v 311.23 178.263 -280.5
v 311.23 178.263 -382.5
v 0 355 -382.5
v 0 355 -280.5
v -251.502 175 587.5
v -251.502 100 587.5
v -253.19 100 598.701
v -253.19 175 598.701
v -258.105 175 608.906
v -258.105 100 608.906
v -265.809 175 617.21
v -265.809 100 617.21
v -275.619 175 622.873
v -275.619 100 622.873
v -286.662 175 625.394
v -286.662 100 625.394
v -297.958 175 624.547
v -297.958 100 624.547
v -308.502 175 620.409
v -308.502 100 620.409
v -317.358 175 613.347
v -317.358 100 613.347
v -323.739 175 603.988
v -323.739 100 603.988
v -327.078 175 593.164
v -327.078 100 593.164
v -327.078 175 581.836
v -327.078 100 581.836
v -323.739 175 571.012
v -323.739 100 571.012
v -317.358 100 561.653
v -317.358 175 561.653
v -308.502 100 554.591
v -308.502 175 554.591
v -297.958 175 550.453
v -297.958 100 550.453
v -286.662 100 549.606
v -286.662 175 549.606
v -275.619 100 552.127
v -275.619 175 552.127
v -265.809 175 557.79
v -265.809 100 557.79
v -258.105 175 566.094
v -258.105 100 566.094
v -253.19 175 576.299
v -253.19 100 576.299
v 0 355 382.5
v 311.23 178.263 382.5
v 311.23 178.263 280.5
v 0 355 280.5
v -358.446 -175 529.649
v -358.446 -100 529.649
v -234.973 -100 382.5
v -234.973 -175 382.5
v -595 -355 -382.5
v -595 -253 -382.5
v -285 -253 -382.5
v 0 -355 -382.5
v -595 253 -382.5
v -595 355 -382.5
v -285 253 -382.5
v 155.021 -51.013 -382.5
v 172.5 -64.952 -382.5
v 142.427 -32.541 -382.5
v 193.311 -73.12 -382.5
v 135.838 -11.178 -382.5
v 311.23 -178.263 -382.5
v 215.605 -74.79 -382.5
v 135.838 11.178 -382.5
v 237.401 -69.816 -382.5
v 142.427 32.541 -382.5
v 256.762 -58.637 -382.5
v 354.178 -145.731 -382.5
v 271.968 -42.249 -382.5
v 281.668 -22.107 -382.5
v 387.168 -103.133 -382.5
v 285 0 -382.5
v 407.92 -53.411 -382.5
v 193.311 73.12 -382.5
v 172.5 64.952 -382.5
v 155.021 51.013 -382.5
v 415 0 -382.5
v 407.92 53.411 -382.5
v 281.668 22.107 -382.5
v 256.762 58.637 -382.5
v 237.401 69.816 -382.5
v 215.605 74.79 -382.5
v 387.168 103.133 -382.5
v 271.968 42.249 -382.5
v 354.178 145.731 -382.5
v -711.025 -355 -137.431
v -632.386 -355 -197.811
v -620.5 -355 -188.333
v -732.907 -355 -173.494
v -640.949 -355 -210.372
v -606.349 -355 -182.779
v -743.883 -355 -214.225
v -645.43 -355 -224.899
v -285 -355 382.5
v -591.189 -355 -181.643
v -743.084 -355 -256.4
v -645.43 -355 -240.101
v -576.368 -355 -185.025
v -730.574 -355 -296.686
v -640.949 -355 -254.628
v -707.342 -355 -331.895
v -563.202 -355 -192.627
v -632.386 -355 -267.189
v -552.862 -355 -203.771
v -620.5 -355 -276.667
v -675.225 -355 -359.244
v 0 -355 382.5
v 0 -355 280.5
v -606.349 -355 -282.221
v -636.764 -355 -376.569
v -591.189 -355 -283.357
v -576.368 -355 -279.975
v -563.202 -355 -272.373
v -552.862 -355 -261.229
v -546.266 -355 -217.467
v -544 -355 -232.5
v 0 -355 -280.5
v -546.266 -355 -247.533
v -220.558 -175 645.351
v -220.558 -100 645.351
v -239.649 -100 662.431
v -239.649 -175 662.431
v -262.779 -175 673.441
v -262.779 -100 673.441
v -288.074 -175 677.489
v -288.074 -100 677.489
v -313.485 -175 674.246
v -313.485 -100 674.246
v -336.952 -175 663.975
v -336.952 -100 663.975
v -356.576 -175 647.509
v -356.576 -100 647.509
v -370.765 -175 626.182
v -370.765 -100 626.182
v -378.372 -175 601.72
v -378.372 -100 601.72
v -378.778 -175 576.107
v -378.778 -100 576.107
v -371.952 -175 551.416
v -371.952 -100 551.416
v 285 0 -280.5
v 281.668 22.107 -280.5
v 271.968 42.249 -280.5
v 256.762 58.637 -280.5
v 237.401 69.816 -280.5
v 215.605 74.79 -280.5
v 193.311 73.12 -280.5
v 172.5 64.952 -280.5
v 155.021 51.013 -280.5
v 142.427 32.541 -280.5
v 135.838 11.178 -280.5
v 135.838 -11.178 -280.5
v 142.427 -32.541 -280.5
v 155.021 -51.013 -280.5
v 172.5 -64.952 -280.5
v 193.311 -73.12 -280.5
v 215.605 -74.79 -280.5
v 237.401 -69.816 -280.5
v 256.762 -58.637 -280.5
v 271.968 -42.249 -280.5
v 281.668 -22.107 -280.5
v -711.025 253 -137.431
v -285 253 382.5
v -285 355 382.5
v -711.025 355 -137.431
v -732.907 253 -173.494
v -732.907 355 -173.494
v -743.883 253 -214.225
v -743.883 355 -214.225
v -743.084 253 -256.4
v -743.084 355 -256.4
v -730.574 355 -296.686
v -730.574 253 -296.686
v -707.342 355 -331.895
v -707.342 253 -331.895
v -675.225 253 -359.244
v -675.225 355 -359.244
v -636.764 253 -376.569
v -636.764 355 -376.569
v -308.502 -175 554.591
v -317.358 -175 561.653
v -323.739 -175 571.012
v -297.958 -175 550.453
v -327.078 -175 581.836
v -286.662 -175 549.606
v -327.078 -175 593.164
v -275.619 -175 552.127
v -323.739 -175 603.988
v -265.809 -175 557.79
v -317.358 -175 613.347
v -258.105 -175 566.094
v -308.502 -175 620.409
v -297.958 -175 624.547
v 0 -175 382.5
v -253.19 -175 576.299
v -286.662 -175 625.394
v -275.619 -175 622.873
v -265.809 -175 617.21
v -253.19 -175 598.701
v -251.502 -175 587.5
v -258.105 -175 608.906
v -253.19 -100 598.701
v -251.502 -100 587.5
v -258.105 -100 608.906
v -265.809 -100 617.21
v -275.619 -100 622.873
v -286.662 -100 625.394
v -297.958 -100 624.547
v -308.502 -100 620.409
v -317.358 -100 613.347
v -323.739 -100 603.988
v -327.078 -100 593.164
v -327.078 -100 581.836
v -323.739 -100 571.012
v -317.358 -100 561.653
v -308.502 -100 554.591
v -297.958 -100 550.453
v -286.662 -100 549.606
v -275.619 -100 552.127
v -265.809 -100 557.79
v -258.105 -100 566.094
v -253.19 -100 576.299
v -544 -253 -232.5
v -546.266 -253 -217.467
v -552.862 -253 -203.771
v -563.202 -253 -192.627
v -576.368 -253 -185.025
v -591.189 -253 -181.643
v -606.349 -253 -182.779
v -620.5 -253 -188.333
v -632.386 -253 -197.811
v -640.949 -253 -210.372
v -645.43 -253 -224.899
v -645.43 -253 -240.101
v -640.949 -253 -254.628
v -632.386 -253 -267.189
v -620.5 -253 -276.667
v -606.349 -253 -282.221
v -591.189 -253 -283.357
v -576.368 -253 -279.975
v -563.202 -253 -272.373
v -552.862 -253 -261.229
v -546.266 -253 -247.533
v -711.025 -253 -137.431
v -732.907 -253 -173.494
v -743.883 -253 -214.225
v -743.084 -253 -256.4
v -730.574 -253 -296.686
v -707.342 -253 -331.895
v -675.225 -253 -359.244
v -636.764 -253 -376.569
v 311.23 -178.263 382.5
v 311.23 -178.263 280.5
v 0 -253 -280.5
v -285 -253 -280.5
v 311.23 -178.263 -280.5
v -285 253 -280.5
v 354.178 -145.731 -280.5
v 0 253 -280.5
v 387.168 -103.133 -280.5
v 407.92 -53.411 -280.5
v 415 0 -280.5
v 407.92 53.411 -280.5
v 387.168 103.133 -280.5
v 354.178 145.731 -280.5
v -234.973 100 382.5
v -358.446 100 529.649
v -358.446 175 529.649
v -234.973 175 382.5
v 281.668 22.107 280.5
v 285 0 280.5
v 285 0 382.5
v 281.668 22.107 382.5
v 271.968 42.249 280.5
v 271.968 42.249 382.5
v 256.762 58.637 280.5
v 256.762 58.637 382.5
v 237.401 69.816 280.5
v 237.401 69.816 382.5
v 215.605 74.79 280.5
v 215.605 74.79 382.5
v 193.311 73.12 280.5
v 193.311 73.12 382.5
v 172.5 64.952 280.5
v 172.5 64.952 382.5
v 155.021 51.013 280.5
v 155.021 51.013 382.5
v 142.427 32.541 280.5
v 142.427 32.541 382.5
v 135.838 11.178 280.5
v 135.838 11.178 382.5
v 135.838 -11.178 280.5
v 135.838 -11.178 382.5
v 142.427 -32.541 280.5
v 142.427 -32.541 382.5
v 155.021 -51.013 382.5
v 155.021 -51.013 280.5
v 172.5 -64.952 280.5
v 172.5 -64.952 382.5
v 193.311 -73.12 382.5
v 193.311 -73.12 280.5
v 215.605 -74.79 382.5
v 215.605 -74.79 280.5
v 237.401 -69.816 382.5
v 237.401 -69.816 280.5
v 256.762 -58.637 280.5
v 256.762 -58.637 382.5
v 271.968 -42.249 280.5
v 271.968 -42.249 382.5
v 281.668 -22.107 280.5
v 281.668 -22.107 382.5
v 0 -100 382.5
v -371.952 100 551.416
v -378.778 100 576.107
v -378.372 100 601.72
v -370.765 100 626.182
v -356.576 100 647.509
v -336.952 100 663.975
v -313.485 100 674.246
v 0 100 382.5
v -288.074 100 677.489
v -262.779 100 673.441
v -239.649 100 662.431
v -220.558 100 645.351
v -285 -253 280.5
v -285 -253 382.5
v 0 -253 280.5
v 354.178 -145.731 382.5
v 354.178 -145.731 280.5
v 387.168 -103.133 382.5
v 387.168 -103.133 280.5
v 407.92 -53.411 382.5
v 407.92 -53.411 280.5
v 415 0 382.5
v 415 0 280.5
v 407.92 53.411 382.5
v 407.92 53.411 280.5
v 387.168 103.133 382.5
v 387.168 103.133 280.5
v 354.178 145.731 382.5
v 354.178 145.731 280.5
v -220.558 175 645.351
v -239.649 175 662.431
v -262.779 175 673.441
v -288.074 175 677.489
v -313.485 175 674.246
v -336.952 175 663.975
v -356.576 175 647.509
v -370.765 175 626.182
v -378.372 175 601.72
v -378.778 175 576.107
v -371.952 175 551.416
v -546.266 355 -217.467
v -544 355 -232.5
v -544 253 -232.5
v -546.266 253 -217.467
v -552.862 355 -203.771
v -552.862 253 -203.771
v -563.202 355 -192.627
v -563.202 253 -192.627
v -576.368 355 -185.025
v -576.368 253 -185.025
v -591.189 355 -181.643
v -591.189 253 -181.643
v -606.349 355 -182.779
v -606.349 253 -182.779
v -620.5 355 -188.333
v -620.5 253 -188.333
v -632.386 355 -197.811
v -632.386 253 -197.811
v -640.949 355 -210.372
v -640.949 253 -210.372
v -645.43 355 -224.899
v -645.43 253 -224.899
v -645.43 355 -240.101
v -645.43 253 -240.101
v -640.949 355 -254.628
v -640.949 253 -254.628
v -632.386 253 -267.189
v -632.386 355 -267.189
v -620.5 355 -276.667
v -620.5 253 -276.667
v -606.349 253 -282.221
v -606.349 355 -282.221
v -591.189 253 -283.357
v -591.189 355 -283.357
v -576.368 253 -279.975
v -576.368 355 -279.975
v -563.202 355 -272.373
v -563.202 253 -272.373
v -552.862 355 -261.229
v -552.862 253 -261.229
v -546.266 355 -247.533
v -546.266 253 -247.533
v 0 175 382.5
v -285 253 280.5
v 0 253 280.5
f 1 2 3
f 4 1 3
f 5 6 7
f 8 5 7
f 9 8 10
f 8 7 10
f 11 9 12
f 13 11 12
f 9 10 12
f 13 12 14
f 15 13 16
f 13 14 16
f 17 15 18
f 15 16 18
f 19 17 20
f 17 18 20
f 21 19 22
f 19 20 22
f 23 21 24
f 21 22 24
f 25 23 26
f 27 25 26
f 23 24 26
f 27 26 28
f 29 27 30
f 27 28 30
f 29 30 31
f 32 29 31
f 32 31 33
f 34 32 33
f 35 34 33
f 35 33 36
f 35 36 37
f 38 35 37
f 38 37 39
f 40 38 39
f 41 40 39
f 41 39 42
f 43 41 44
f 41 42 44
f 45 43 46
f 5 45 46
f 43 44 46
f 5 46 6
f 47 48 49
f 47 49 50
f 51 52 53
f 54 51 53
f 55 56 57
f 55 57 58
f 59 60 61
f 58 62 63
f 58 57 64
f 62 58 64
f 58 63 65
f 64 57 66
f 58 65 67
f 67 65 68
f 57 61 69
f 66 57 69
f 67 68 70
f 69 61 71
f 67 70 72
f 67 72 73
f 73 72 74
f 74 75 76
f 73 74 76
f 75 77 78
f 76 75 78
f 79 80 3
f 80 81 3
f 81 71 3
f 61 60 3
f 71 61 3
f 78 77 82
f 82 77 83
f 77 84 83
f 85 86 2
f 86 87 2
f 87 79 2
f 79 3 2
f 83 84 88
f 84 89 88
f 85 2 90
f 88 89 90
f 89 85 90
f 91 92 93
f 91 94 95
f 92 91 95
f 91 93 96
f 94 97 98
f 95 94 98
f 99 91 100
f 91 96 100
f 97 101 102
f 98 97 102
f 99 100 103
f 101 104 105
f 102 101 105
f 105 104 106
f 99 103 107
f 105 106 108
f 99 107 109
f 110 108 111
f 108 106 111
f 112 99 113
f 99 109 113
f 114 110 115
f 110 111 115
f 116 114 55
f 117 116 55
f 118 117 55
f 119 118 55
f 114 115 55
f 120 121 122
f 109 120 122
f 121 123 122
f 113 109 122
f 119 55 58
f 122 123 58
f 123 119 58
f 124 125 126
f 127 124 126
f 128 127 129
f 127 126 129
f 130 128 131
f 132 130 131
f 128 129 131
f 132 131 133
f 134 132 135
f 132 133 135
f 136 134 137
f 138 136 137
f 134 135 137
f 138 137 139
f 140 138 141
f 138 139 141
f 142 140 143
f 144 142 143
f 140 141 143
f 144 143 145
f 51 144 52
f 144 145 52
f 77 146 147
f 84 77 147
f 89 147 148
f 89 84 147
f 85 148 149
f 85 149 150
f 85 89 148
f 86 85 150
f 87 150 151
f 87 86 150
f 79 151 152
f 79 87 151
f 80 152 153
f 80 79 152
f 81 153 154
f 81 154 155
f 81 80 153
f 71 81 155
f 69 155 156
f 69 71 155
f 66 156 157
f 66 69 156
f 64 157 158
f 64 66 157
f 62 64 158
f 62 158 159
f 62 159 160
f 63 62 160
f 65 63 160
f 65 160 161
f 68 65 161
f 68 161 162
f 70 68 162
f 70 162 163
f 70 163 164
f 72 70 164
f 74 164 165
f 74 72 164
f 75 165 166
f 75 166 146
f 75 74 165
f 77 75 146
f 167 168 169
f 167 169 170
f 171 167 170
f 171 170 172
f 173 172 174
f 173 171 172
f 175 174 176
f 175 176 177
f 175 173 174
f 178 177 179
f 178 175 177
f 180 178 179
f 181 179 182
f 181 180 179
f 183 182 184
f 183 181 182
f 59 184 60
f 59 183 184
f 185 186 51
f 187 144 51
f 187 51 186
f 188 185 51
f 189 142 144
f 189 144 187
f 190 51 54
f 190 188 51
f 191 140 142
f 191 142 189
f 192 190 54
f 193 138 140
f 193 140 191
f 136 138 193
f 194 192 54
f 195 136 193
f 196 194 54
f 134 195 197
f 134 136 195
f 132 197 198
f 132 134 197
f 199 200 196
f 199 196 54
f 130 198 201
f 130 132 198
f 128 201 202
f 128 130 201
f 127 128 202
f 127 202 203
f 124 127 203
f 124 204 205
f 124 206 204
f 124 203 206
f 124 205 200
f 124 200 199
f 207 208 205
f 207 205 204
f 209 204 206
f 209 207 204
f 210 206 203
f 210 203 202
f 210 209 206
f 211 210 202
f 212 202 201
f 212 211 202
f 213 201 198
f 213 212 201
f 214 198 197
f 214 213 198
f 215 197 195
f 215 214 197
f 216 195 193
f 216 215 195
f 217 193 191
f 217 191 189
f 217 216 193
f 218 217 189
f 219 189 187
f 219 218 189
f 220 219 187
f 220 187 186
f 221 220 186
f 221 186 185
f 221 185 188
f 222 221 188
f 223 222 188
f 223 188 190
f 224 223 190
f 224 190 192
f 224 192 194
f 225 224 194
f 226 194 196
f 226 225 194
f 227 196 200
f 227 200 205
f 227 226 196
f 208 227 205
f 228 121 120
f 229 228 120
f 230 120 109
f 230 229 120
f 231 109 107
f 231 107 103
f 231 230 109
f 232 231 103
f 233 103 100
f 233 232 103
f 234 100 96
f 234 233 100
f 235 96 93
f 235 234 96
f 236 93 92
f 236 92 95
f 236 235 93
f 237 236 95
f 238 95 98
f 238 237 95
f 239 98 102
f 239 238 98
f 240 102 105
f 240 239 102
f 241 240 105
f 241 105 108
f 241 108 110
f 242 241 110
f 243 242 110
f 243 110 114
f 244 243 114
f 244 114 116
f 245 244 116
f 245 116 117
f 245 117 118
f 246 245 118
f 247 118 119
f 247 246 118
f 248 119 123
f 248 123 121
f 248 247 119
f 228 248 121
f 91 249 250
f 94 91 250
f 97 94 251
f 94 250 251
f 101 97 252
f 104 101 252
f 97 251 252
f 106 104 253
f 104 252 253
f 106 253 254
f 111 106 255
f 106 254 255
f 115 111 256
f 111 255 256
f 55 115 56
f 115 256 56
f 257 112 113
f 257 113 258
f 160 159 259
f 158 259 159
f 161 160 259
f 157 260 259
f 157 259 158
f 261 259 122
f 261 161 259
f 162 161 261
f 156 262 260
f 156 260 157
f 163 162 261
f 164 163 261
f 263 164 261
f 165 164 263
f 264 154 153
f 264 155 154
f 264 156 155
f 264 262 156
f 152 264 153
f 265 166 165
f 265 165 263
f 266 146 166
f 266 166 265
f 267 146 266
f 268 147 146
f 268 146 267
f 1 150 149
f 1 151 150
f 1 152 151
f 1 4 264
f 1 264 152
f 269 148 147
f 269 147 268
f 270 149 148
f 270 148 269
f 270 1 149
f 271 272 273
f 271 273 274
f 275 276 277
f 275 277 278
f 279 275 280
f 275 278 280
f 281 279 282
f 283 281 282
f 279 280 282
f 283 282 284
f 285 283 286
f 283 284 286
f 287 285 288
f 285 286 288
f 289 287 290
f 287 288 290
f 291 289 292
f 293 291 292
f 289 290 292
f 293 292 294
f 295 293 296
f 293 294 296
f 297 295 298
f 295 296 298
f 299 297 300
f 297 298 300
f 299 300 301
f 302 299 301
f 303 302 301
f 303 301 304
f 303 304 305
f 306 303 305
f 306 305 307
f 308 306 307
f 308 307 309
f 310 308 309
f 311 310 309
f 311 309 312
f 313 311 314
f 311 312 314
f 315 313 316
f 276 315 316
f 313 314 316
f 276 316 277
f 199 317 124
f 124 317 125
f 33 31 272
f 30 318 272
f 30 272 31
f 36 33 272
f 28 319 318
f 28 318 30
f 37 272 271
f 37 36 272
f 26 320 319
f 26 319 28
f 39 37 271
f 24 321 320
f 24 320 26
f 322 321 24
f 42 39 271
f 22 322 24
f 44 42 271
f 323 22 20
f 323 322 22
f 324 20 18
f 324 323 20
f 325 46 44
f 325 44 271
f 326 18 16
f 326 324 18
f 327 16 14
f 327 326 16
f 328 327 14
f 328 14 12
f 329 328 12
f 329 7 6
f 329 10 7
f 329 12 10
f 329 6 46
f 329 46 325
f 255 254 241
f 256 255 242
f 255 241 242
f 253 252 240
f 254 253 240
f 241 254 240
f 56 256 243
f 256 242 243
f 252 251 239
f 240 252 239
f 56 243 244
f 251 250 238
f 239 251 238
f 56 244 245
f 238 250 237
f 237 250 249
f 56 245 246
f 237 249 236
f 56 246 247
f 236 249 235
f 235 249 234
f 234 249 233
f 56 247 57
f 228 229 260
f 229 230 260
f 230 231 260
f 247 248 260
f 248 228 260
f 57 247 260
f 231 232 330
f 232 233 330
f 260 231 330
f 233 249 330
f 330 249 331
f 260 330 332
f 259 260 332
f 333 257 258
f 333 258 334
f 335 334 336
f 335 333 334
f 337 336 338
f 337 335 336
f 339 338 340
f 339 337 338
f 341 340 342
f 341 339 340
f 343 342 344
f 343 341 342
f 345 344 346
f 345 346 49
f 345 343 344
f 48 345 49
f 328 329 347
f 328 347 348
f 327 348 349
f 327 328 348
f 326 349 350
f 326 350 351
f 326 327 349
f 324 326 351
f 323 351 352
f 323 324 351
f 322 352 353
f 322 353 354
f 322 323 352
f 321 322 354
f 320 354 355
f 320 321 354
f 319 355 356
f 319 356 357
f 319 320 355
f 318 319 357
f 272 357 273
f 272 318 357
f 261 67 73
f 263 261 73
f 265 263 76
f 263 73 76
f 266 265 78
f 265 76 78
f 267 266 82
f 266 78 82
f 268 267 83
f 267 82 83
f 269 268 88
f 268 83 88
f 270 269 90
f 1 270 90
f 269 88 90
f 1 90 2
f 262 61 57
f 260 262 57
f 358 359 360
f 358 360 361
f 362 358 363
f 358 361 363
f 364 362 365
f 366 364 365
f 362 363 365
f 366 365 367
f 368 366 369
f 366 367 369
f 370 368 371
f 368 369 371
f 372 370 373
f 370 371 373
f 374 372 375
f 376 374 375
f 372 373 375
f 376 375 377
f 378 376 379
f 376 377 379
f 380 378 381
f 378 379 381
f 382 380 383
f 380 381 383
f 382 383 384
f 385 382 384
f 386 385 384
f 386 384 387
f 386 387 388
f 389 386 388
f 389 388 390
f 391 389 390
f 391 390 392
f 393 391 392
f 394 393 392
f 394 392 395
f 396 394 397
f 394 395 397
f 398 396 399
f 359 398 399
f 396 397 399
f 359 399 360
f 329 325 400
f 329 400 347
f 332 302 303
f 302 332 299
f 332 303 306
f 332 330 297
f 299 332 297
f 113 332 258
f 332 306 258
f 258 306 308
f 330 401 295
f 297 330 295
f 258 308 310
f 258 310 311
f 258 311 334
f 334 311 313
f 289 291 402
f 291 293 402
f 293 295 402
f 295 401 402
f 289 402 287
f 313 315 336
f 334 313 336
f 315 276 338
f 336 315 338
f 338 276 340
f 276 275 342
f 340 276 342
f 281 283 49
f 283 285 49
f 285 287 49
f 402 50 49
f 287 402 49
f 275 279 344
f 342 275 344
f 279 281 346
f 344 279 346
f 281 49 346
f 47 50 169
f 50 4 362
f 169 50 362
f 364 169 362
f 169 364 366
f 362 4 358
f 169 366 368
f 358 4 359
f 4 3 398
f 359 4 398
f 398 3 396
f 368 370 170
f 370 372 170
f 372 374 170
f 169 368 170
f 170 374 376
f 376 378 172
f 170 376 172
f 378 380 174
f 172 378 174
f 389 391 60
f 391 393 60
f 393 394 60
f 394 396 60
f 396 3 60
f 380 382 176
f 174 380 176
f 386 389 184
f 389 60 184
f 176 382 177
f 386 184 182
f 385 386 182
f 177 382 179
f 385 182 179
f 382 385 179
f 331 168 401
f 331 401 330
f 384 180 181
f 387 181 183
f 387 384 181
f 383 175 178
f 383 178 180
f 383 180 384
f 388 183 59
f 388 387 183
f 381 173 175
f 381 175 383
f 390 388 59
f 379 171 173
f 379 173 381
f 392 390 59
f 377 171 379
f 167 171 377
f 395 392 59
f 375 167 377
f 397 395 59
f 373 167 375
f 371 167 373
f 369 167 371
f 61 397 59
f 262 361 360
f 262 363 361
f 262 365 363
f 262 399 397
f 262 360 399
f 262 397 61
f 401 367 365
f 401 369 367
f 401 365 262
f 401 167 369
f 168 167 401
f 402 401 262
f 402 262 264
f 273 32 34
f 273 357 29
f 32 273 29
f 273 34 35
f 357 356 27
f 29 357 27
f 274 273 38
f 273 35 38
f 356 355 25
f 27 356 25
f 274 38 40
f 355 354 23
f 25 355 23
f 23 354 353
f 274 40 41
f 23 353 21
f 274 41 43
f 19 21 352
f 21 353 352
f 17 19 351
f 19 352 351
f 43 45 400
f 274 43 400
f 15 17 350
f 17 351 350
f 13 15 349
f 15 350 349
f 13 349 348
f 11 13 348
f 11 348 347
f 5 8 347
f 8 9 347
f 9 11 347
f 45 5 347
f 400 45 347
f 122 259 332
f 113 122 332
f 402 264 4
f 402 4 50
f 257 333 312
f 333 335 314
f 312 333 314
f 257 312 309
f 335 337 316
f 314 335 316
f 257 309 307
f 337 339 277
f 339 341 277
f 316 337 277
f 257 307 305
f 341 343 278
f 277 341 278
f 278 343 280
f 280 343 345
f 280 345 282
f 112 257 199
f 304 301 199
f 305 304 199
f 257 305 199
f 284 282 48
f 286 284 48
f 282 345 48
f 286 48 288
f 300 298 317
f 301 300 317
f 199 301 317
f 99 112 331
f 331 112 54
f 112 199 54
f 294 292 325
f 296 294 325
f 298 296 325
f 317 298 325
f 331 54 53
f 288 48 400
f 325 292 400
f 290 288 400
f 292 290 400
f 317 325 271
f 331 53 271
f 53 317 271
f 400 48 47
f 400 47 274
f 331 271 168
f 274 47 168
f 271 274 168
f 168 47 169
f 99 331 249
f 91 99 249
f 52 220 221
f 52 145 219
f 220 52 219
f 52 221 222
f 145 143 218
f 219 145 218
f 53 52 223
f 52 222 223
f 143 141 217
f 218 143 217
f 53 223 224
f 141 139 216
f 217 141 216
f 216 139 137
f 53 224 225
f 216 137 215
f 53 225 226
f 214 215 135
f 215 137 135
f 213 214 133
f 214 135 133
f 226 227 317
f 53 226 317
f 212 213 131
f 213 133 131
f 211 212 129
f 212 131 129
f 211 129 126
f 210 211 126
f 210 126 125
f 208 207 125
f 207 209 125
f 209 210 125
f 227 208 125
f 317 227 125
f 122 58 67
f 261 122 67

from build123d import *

# Parameters (mm, degrees)
F1_R      = 51
F2_DEPTH  = 102
F4_W      = 285
F4_H      = 102
F4_R      = 75
F5_DEPTH  = 102
F9_R      = 38
F10_DEPTH = 75


# Not quite as in the source:
# - a pattern or mirror of a feature is missing from the dataset's text; its kind, count and spacing are read off the source's solid


with BuildPart() as f2:
    # F1 (on offset) → F2 (new body)
    with BuildSketch(Plane.XZ.offset(253)):
        with BuildLine():
            Line((0, -382.5), (0, 382.5))
            Line((0, 382.5), (-285, 382.5))
            Line((-285, 382.5), (-711.024961042, -137.4305074422))
            ThreePointArc((-711.024961042, -137.4305074422), (-730.5736402913, -296.6855751565), (-595, -382.5))
            Line((-595, -382.5), (0, -382.5))
        make_face()
        with Locations((-595, -232.5)):
            Circle(F1_R, mode=Mode.SUBTRACT)
    extrude(amount=F2_DEPTH)


with BuildPart() as f3_1:
    # F3: instance of F2
    add(f2.part.mirror(Plane.XZ))


with BuildPart() as f5:
    # F4 (on face) → F5 (new body)
    with BuildSketch(Plane.XY.offset(382.5)):
        with Locations((-142.5, -304)):
            Rectangle(F4_W, F4_H)
        with BuildLine():
            Line((311.2296497268, 178.2626096976), (0, 355))
            Line((0, 355), (-285, 355))
            Line((-285, 355), (-285, -253))
            Line((-285, -253), (0, -253))
            Line((0, -253), (0, -355))
            Line((0, -355), (311.2296497268, -178.2626096976))
            ThreePointArc((311.2296497268, -178.2626096976), (415, 0), (311.2296497268, 178.2626096976))
        make_face()
        with Locations((210, 0)):
            Circle(F4_R, mode=Mode.SUBTRACT)
    extrude(amount=-F5_DEPTH)


with BuildPart() as f6_1:
    # F6: instance of F5
    add(f5.part.mirror(Plane.XY))

    # F7: union F2, F3_1, F5
    add(f2.part)
    add(f3_1.part)
    add(f5.part)

    # F9 (on offset) → F10 (join)
    with BuildSketch(Plane.XZ.offset(100)):
        with BuildLine():
            Line((-234.9733120798, 382.5), (0, 382.5))
            Line((0, 382.5), (-220.5580805505, 645.3508848718))
            ThreePointArc((-220.5580805505, 645.3508848718), (-347.352965303, 656.4439998807), (-358.446080312, 529.6491151282))
            Line((-358.446080312, 529.6491151282), (-234.9733120798, 382.5))
        make_face()
        with Locations((-289.5020804312, 587.5)):
            Circle(F9_R, mode=Mode.SUBTRACT)
    f10 = extrude(amount=F10_DEPTH)

    # F10_copies: F10 across plane
    add(f10.mirror(Plane.ZX))


solid = f6_1.part
